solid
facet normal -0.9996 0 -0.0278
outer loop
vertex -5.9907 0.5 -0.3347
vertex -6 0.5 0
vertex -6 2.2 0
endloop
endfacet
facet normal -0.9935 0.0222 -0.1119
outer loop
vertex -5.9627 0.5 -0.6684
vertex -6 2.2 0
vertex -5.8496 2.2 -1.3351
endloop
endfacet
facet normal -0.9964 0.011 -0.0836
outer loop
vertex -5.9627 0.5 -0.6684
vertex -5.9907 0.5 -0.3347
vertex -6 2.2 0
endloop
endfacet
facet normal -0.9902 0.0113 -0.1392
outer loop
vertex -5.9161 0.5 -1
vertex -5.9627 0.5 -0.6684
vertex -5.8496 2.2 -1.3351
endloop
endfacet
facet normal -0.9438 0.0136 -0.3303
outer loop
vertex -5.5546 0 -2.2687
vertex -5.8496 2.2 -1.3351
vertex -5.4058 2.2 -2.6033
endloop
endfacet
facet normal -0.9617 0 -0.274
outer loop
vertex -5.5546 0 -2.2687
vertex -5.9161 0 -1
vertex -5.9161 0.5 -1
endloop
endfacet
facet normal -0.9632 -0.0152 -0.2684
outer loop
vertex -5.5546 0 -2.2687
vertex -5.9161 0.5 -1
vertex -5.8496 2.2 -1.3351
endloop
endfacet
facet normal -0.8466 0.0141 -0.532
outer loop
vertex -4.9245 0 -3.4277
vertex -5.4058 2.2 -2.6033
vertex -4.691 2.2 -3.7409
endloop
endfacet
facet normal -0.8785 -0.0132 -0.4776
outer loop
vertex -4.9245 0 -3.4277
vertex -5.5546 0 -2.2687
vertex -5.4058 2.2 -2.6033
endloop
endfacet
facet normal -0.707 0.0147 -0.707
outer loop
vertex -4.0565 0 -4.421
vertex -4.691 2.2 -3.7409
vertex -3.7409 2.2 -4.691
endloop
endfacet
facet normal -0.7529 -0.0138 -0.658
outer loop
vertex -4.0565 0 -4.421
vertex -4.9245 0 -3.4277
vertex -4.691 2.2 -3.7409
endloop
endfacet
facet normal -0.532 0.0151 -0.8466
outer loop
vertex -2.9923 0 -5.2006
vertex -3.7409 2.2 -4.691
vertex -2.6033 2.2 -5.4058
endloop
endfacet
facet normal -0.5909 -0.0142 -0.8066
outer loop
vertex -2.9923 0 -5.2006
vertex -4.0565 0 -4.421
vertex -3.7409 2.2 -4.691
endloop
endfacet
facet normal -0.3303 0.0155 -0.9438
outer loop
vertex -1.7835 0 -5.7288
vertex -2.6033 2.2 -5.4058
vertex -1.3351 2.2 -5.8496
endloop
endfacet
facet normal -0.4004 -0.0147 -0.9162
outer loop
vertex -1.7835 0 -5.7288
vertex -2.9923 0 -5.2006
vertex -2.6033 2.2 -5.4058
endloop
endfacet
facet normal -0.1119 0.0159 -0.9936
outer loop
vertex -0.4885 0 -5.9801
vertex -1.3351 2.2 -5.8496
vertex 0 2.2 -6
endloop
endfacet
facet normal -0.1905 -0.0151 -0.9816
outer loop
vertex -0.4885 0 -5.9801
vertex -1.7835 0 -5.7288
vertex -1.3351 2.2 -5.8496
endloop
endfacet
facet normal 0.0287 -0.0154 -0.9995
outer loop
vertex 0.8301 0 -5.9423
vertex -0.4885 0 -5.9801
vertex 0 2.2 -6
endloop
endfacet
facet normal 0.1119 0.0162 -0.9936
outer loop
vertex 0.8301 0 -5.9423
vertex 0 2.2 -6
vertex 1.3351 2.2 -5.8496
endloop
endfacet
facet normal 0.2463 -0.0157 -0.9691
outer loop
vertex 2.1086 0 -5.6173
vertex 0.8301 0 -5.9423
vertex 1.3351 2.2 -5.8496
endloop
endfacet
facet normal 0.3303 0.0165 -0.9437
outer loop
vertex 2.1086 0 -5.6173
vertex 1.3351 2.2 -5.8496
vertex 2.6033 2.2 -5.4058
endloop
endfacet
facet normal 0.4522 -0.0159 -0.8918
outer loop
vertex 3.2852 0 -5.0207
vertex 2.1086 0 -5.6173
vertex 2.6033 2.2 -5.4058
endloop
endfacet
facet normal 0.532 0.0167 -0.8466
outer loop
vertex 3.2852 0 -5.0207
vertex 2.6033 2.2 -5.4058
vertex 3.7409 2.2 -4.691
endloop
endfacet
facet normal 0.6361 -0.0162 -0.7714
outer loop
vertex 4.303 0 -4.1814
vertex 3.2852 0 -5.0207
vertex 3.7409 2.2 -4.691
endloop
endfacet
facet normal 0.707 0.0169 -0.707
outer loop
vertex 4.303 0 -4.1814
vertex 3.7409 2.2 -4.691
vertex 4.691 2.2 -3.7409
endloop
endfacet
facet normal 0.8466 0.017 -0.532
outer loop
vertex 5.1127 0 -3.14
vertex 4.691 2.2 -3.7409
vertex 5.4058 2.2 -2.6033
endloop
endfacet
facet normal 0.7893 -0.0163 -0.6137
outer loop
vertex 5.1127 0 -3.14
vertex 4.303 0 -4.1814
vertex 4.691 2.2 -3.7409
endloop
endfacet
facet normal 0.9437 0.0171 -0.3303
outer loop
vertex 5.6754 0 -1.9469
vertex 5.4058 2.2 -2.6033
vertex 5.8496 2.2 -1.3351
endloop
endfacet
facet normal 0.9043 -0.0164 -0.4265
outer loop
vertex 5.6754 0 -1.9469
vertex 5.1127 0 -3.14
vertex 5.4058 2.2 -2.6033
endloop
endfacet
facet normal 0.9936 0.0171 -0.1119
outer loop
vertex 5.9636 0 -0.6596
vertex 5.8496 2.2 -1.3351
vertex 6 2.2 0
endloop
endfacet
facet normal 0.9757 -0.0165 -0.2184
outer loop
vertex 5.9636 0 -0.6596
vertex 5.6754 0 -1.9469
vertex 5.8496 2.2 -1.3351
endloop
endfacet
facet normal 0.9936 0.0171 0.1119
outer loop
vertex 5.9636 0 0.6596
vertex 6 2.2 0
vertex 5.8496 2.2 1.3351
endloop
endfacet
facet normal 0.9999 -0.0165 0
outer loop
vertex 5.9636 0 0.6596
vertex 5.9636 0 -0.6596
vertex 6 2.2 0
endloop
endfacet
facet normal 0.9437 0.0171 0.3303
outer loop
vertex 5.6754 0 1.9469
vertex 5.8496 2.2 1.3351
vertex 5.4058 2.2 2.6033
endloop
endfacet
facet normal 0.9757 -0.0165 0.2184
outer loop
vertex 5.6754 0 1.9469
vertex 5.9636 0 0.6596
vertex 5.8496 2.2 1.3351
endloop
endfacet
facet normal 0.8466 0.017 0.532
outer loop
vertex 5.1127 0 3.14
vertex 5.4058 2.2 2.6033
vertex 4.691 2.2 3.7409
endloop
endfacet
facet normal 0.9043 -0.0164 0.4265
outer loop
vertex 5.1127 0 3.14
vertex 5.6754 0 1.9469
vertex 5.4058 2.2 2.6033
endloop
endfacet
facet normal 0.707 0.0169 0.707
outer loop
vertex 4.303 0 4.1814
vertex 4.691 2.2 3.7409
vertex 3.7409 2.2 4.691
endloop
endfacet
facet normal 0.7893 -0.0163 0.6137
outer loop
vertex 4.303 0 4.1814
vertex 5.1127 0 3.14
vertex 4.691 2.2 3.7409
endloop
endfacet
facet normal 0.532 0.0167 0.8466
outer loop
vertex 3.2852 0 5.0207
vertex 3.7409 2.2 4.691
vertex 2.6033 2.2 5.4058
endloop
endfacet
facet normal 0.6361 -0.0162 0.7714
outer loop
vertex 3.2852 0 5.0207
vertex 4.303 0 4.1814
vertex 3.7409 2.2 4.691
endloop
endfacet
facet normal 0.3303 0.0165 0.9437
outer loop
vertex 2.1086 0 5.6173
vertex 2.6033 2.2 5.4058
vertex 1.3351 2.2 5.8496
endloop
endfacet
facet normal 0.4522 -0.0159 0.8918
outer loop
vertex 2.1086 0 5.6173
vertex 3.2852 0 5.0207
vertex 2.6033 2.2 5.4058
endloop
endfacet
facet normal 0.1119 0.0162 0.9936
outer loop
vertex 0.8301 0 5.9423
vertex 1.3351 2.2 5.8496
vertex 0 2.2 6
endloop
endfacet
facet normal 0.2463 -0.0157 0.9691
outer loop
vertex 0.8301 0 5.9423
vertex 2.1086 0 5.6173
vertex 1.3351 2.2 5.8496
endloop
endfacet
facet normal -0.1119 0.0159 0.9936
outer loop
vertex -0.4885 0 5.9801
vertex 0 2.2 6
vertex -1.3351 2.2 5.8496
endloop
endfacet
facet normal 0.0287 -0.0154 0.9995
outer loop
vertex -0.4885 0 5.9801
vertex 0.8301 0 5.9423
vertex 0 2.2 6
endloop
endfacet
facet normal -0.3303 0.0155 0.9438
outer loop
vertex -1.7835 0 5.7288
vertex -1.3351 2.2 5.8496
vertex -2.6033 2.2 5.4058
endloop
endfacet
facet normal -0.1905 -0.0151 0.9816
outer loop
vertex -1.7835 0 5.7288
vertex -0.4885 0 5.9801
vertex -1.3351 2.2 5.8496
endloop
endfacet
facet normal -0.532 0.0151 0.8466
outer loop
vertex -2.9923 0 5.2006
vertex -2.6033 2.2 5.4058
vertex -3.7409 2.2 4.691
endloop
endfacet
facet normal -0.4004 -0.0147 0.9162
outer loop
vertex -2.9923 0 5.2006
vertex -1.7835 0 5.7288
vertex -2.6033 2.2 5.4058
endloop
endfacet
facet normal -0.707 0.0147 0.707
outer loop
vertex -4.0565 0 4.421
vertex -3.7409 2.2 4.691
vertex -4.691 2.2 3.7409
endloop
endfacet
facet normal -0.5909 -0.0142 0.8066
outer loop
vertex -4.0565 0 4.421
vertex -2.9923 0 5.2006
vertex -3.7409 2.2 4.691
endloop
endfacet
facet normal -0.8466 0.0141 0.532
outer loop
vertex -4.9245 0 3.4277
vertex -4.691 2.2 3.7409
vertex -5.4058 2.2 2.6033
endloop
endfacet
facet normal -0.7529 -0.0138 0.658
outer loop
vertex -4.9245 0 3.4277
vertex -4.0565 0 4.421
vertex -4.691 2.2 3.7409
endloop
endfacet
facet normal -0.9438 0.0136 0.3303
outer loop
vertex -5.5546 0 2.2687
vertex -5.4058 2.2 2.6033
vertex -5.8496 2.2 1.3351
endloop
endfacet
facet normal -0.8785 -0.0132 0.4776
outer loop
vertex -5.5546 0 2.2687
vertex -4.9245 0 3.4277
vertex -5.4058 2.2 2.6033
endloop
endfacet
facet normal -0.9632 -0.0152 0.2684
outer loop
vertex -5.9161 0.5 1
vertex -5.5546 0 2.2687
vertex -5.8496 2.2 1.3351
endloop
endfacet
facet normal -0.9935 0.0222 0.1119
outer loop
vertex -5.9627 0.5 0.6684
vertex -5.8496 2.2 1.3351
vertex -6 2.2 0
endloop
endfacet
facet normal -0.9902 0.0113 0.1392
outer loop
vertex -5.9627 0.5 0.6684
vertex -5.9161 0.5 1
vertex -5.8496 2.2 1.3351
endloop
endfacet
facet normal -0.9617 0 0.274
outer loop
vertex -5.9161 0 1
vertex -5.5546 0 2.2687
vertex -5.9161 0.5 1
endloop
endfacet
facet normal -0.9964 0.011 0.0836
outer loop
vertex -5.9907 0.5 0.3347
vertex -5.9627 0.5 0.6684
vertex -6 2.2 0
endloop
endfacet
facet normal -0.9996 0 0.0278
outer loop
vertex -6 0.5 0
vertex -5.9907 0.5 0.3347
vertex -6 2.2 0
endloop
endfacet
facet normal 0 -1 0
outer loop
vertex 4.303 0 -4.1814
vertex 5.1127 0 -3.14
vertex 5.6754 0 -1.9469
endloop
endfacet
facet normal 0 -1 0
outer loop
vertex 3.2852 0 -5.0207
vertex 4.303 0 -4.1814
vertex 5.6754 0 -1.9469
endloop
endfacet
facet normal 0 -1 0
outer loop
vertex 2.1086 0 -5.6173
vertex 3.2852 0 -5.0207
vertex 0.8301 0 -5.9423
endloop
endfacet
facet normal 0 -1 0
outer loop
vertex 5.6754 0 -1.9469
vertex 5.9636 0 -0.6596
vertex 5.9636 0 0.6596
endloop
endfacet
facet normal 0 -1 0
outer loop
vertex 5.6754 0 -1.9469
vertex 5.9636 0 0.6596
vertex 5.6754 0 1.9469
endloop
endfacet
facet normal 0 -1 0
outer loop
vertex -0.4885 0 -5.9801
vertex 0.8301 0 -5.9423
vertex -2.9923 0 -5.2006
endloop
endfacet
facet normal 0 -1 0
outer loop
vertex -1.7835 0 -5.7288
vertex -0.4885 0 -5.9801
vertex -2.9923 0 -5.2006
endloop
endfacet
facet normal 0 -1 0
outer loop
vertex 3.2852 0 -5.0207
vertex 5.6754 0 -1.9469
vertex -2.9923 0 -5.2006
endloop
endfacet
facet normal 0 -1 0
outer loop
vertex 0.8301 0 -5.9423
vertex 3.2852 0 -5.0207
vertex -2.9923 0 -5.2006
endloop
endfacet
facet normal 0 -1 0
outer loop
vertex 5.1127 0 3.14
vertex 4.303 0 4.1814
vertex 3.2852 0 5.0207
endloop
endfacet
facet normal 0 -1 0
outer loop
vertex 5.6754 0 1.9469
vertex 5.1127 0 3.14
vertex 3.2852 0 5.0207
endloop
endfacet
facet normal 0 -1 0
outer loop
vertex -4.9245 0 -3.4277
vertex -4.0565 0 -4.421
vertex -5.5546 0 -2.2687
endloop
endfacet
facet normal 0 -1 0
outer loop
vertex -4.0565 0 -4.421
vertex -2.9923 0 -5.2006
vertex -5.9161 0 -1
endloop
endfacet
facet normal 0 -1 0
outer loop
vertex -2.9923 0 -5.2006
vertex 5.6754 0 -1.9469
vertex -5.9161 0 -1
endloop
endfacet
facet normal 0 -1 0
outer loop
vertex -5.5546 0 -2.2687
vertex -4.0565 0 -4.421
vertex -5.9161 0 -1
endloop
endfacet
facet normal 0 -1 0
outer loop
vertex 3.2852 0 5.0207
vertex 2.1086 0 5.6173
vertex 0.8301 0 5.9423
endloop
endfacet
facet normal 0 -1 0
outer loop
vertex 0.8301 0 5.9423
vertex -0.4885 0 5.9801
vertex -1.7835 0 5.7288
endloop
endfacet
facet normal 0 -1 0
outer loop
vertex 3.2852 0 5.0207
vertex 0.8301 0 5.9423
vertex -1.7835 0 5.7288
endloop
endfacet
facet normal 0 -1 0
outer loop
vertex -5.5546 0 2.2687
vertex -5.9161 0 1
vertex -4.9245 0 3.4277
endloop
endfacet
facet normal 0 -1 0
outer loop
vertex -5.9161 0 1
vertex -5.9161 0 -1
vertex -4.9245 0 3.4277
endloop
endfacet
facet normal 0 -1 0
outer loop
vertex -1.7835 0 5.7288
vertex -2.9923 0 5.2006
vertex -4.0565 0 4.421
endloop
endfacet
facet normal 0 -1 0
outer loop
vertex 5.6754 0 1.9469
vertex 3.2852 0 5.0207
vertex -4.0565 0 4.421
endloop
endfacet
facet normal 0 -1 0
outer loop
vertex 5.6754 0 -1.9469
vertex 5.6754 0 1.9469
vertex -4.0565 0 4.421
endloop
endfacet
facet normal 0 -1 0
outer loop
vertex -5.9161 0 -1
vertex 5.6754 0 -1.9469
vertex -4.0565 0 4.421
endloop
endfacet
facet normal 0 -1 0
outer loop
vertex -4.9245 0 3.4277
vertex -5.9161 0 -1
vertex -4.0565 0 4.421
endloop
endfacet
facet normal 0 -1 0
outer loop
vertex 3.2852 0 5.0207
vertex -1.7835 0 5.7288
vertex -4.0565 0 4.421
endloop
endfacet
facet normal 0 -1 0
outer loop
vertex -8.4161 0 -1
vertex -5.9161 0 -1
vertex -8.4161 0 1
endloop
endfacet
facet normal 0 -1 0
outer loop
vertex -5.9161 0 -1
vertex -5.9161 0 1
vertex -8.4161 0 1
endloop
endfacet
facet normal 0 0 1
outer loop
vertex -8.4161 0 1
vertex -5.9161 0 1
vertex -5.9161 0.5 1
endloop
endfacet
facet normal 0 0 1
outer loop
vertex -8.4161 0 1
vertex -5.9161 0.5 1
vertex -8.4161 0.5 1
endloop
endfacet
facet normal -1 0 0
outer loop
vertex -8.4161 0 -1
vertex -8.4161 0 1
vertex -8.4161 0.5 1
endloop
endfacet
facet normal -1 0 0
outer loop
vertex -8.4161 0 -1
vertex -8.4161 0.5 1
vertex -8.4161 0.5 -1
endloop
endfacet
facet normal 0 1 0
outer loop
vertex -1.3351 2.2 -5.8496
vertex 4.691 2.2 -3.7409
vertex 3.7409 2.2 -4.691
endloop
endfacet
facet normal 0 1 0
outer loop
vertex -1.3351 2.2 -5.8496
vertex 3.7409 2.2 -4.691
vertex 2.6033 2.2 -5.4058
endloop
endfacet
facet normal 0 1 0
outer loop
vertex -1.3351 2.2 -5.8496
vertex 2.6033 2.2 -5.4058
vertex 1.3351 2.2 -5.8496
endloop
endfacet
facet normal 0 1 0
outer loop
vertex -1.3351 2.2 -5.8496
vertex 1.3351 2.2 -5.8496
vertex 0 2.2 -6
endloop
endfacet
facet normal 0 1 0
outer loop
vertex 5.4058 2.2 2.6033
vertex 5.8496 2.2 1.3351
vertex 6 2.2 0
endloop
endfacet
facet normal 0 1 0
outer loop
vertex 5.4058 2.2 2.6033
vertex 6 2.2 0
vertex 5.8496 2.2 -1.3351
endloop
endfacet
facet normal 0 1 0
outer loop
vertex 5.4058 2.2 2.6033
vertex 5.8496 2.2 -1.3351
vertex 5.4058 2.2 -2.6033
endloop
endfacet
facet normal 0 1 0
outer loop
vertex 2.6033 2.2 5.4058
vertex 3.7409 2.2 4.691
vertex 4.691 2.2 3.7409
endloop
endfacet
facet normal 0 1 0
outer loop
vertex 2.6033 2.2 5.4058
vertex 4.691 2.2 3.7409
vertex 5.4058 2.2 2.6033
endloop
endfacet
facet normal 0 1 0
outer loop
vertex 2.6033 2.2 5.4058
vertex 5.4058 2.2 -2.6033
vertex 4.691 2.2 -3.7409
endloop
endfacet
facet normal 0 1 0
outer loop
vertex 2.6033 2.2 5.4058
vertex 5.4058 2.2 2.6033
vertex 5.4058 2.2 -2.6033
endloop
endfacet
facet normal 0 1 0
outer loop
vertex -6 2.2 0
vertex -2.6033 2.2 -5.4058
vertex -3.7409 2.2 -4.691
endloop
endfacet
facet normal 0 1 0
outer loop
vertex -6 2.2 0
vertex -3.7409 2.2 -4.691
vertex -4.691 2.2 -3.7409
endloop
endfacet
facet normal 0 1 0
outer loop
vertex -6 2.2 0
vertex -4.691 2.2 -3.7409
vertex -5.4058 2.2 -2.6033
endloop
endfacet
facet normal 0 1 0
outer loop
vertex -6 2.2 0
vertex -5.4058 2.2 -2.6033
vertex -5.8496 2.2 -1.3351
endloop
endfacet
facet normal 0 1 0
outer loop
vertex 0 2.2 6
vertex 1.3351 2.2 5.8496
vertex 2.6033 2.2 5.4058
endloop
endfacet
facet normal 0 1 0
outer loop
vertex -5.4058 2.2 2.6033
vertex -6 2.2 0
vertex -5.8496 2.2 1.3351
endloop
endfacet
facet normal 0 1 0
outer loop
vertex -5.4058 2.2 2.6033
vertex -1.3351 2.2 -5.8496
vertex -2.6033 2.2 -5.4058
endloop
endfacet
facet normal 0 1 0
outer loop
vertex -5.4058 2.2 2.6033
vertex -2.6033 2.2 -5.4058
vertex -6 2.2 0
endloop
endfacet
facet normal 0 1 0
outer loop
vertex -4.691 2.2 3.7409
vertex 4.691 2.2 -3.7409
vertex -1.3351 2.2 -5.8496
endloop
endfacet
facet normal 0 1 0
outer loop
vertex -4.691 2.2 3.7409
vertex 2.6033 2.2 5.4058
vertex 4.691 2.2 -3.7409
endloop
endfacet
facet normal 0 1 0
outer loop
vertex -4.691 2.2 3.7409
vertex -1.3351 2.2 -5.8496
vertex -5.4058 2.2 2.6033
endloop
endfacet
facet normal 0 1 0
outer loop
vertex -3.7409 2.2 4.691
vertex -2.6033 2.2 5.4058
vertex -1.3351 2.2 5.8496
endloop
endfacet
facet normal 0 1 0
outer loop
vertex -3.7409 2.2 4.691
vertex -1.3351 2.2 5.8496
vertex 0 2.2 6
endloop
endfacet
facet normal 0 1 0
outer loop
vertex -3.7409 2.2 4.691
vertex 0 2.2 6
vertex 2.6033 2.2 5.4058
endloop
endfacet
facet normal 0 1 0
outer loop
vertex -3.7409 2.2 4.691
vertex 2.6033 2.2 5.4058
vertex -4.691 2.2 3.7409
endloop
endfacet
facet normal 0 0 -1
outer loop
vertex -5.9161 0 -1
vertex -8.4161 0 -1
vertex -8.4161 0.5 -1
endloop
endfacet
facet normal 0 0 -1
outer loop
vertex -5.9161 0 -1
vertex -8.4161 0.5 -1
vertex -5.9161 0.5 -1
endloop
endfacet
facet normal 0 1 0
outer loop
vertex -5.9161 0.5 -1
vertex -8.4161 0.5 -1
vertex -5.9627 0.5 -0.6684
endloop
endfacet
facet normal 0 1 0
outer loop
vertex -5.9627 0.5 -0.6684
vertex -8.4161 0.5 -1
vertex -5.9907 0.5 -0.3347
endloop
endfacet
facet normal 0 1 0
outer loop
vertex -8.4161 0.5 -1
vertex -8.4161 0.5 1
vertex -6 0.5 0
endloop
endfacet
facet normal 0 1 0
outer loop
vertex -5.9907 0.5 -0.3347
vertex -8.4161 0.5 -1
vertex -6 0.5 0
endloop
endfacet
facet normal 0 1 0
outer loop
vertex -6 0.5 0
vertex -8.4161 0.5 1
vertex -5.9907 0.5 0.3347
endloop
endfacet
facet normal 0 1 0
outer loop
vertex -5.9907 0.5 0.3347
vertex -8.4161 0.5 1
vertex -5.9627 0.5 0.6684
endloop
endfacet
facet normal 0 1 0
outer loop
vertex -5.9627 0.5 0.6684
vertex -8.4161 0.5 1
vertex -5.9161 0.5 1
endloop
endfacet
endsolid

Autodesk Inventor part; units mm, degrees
ref_plane "YZ Plane" through (0, 0, 0) normal (1, 0, 0) x (0, 1, 0)
ref_plane "XZ Plane" through (0, 0, 0) normal (0, 1, 0) x (-1, 0, 0)
ref_plane "XY Plane" through (0, 0, 0) normal (0, 0, 1) x (1, 0, 0)
sketch "スケッチ1" plane through (0, 0, 0) normal (0, 1, 0) x (-1, 0, 0)
  circle A0 centre (0, 0) radius 6
  dimension "d0" = 12
extrude "押し出し1" add sketch "スケッチ1" along normal blind 2.2
sketch "スケッチ2" plane through (0, 0, 0) normal (0, -1, 0) x (1, 0, 0)
  circle A0 centre (0, 0) radius 6 projected
  line L0 (-5.9161, 1) -> (-8.4161, 1)
  line L1 (-8.4161, 1) -> (-8.4161, -1)
  line L2 (-8.4161, -1) -> (-5.9161, -1)
  line L3 (-5.9161, -1) -> (-5.9161, 1)
  circle A1 centre (0, 0) radius 6 projected
  dimension "d3" = 2
  dimension "d4" = 2.5
extrude "押し出し2" add sketch "スケッチ2" against normal blind 0.5 contours L3 A0 | A0 L2 L1 L0 picked at (-5.941, 0.1116)
properties part number "motor"
